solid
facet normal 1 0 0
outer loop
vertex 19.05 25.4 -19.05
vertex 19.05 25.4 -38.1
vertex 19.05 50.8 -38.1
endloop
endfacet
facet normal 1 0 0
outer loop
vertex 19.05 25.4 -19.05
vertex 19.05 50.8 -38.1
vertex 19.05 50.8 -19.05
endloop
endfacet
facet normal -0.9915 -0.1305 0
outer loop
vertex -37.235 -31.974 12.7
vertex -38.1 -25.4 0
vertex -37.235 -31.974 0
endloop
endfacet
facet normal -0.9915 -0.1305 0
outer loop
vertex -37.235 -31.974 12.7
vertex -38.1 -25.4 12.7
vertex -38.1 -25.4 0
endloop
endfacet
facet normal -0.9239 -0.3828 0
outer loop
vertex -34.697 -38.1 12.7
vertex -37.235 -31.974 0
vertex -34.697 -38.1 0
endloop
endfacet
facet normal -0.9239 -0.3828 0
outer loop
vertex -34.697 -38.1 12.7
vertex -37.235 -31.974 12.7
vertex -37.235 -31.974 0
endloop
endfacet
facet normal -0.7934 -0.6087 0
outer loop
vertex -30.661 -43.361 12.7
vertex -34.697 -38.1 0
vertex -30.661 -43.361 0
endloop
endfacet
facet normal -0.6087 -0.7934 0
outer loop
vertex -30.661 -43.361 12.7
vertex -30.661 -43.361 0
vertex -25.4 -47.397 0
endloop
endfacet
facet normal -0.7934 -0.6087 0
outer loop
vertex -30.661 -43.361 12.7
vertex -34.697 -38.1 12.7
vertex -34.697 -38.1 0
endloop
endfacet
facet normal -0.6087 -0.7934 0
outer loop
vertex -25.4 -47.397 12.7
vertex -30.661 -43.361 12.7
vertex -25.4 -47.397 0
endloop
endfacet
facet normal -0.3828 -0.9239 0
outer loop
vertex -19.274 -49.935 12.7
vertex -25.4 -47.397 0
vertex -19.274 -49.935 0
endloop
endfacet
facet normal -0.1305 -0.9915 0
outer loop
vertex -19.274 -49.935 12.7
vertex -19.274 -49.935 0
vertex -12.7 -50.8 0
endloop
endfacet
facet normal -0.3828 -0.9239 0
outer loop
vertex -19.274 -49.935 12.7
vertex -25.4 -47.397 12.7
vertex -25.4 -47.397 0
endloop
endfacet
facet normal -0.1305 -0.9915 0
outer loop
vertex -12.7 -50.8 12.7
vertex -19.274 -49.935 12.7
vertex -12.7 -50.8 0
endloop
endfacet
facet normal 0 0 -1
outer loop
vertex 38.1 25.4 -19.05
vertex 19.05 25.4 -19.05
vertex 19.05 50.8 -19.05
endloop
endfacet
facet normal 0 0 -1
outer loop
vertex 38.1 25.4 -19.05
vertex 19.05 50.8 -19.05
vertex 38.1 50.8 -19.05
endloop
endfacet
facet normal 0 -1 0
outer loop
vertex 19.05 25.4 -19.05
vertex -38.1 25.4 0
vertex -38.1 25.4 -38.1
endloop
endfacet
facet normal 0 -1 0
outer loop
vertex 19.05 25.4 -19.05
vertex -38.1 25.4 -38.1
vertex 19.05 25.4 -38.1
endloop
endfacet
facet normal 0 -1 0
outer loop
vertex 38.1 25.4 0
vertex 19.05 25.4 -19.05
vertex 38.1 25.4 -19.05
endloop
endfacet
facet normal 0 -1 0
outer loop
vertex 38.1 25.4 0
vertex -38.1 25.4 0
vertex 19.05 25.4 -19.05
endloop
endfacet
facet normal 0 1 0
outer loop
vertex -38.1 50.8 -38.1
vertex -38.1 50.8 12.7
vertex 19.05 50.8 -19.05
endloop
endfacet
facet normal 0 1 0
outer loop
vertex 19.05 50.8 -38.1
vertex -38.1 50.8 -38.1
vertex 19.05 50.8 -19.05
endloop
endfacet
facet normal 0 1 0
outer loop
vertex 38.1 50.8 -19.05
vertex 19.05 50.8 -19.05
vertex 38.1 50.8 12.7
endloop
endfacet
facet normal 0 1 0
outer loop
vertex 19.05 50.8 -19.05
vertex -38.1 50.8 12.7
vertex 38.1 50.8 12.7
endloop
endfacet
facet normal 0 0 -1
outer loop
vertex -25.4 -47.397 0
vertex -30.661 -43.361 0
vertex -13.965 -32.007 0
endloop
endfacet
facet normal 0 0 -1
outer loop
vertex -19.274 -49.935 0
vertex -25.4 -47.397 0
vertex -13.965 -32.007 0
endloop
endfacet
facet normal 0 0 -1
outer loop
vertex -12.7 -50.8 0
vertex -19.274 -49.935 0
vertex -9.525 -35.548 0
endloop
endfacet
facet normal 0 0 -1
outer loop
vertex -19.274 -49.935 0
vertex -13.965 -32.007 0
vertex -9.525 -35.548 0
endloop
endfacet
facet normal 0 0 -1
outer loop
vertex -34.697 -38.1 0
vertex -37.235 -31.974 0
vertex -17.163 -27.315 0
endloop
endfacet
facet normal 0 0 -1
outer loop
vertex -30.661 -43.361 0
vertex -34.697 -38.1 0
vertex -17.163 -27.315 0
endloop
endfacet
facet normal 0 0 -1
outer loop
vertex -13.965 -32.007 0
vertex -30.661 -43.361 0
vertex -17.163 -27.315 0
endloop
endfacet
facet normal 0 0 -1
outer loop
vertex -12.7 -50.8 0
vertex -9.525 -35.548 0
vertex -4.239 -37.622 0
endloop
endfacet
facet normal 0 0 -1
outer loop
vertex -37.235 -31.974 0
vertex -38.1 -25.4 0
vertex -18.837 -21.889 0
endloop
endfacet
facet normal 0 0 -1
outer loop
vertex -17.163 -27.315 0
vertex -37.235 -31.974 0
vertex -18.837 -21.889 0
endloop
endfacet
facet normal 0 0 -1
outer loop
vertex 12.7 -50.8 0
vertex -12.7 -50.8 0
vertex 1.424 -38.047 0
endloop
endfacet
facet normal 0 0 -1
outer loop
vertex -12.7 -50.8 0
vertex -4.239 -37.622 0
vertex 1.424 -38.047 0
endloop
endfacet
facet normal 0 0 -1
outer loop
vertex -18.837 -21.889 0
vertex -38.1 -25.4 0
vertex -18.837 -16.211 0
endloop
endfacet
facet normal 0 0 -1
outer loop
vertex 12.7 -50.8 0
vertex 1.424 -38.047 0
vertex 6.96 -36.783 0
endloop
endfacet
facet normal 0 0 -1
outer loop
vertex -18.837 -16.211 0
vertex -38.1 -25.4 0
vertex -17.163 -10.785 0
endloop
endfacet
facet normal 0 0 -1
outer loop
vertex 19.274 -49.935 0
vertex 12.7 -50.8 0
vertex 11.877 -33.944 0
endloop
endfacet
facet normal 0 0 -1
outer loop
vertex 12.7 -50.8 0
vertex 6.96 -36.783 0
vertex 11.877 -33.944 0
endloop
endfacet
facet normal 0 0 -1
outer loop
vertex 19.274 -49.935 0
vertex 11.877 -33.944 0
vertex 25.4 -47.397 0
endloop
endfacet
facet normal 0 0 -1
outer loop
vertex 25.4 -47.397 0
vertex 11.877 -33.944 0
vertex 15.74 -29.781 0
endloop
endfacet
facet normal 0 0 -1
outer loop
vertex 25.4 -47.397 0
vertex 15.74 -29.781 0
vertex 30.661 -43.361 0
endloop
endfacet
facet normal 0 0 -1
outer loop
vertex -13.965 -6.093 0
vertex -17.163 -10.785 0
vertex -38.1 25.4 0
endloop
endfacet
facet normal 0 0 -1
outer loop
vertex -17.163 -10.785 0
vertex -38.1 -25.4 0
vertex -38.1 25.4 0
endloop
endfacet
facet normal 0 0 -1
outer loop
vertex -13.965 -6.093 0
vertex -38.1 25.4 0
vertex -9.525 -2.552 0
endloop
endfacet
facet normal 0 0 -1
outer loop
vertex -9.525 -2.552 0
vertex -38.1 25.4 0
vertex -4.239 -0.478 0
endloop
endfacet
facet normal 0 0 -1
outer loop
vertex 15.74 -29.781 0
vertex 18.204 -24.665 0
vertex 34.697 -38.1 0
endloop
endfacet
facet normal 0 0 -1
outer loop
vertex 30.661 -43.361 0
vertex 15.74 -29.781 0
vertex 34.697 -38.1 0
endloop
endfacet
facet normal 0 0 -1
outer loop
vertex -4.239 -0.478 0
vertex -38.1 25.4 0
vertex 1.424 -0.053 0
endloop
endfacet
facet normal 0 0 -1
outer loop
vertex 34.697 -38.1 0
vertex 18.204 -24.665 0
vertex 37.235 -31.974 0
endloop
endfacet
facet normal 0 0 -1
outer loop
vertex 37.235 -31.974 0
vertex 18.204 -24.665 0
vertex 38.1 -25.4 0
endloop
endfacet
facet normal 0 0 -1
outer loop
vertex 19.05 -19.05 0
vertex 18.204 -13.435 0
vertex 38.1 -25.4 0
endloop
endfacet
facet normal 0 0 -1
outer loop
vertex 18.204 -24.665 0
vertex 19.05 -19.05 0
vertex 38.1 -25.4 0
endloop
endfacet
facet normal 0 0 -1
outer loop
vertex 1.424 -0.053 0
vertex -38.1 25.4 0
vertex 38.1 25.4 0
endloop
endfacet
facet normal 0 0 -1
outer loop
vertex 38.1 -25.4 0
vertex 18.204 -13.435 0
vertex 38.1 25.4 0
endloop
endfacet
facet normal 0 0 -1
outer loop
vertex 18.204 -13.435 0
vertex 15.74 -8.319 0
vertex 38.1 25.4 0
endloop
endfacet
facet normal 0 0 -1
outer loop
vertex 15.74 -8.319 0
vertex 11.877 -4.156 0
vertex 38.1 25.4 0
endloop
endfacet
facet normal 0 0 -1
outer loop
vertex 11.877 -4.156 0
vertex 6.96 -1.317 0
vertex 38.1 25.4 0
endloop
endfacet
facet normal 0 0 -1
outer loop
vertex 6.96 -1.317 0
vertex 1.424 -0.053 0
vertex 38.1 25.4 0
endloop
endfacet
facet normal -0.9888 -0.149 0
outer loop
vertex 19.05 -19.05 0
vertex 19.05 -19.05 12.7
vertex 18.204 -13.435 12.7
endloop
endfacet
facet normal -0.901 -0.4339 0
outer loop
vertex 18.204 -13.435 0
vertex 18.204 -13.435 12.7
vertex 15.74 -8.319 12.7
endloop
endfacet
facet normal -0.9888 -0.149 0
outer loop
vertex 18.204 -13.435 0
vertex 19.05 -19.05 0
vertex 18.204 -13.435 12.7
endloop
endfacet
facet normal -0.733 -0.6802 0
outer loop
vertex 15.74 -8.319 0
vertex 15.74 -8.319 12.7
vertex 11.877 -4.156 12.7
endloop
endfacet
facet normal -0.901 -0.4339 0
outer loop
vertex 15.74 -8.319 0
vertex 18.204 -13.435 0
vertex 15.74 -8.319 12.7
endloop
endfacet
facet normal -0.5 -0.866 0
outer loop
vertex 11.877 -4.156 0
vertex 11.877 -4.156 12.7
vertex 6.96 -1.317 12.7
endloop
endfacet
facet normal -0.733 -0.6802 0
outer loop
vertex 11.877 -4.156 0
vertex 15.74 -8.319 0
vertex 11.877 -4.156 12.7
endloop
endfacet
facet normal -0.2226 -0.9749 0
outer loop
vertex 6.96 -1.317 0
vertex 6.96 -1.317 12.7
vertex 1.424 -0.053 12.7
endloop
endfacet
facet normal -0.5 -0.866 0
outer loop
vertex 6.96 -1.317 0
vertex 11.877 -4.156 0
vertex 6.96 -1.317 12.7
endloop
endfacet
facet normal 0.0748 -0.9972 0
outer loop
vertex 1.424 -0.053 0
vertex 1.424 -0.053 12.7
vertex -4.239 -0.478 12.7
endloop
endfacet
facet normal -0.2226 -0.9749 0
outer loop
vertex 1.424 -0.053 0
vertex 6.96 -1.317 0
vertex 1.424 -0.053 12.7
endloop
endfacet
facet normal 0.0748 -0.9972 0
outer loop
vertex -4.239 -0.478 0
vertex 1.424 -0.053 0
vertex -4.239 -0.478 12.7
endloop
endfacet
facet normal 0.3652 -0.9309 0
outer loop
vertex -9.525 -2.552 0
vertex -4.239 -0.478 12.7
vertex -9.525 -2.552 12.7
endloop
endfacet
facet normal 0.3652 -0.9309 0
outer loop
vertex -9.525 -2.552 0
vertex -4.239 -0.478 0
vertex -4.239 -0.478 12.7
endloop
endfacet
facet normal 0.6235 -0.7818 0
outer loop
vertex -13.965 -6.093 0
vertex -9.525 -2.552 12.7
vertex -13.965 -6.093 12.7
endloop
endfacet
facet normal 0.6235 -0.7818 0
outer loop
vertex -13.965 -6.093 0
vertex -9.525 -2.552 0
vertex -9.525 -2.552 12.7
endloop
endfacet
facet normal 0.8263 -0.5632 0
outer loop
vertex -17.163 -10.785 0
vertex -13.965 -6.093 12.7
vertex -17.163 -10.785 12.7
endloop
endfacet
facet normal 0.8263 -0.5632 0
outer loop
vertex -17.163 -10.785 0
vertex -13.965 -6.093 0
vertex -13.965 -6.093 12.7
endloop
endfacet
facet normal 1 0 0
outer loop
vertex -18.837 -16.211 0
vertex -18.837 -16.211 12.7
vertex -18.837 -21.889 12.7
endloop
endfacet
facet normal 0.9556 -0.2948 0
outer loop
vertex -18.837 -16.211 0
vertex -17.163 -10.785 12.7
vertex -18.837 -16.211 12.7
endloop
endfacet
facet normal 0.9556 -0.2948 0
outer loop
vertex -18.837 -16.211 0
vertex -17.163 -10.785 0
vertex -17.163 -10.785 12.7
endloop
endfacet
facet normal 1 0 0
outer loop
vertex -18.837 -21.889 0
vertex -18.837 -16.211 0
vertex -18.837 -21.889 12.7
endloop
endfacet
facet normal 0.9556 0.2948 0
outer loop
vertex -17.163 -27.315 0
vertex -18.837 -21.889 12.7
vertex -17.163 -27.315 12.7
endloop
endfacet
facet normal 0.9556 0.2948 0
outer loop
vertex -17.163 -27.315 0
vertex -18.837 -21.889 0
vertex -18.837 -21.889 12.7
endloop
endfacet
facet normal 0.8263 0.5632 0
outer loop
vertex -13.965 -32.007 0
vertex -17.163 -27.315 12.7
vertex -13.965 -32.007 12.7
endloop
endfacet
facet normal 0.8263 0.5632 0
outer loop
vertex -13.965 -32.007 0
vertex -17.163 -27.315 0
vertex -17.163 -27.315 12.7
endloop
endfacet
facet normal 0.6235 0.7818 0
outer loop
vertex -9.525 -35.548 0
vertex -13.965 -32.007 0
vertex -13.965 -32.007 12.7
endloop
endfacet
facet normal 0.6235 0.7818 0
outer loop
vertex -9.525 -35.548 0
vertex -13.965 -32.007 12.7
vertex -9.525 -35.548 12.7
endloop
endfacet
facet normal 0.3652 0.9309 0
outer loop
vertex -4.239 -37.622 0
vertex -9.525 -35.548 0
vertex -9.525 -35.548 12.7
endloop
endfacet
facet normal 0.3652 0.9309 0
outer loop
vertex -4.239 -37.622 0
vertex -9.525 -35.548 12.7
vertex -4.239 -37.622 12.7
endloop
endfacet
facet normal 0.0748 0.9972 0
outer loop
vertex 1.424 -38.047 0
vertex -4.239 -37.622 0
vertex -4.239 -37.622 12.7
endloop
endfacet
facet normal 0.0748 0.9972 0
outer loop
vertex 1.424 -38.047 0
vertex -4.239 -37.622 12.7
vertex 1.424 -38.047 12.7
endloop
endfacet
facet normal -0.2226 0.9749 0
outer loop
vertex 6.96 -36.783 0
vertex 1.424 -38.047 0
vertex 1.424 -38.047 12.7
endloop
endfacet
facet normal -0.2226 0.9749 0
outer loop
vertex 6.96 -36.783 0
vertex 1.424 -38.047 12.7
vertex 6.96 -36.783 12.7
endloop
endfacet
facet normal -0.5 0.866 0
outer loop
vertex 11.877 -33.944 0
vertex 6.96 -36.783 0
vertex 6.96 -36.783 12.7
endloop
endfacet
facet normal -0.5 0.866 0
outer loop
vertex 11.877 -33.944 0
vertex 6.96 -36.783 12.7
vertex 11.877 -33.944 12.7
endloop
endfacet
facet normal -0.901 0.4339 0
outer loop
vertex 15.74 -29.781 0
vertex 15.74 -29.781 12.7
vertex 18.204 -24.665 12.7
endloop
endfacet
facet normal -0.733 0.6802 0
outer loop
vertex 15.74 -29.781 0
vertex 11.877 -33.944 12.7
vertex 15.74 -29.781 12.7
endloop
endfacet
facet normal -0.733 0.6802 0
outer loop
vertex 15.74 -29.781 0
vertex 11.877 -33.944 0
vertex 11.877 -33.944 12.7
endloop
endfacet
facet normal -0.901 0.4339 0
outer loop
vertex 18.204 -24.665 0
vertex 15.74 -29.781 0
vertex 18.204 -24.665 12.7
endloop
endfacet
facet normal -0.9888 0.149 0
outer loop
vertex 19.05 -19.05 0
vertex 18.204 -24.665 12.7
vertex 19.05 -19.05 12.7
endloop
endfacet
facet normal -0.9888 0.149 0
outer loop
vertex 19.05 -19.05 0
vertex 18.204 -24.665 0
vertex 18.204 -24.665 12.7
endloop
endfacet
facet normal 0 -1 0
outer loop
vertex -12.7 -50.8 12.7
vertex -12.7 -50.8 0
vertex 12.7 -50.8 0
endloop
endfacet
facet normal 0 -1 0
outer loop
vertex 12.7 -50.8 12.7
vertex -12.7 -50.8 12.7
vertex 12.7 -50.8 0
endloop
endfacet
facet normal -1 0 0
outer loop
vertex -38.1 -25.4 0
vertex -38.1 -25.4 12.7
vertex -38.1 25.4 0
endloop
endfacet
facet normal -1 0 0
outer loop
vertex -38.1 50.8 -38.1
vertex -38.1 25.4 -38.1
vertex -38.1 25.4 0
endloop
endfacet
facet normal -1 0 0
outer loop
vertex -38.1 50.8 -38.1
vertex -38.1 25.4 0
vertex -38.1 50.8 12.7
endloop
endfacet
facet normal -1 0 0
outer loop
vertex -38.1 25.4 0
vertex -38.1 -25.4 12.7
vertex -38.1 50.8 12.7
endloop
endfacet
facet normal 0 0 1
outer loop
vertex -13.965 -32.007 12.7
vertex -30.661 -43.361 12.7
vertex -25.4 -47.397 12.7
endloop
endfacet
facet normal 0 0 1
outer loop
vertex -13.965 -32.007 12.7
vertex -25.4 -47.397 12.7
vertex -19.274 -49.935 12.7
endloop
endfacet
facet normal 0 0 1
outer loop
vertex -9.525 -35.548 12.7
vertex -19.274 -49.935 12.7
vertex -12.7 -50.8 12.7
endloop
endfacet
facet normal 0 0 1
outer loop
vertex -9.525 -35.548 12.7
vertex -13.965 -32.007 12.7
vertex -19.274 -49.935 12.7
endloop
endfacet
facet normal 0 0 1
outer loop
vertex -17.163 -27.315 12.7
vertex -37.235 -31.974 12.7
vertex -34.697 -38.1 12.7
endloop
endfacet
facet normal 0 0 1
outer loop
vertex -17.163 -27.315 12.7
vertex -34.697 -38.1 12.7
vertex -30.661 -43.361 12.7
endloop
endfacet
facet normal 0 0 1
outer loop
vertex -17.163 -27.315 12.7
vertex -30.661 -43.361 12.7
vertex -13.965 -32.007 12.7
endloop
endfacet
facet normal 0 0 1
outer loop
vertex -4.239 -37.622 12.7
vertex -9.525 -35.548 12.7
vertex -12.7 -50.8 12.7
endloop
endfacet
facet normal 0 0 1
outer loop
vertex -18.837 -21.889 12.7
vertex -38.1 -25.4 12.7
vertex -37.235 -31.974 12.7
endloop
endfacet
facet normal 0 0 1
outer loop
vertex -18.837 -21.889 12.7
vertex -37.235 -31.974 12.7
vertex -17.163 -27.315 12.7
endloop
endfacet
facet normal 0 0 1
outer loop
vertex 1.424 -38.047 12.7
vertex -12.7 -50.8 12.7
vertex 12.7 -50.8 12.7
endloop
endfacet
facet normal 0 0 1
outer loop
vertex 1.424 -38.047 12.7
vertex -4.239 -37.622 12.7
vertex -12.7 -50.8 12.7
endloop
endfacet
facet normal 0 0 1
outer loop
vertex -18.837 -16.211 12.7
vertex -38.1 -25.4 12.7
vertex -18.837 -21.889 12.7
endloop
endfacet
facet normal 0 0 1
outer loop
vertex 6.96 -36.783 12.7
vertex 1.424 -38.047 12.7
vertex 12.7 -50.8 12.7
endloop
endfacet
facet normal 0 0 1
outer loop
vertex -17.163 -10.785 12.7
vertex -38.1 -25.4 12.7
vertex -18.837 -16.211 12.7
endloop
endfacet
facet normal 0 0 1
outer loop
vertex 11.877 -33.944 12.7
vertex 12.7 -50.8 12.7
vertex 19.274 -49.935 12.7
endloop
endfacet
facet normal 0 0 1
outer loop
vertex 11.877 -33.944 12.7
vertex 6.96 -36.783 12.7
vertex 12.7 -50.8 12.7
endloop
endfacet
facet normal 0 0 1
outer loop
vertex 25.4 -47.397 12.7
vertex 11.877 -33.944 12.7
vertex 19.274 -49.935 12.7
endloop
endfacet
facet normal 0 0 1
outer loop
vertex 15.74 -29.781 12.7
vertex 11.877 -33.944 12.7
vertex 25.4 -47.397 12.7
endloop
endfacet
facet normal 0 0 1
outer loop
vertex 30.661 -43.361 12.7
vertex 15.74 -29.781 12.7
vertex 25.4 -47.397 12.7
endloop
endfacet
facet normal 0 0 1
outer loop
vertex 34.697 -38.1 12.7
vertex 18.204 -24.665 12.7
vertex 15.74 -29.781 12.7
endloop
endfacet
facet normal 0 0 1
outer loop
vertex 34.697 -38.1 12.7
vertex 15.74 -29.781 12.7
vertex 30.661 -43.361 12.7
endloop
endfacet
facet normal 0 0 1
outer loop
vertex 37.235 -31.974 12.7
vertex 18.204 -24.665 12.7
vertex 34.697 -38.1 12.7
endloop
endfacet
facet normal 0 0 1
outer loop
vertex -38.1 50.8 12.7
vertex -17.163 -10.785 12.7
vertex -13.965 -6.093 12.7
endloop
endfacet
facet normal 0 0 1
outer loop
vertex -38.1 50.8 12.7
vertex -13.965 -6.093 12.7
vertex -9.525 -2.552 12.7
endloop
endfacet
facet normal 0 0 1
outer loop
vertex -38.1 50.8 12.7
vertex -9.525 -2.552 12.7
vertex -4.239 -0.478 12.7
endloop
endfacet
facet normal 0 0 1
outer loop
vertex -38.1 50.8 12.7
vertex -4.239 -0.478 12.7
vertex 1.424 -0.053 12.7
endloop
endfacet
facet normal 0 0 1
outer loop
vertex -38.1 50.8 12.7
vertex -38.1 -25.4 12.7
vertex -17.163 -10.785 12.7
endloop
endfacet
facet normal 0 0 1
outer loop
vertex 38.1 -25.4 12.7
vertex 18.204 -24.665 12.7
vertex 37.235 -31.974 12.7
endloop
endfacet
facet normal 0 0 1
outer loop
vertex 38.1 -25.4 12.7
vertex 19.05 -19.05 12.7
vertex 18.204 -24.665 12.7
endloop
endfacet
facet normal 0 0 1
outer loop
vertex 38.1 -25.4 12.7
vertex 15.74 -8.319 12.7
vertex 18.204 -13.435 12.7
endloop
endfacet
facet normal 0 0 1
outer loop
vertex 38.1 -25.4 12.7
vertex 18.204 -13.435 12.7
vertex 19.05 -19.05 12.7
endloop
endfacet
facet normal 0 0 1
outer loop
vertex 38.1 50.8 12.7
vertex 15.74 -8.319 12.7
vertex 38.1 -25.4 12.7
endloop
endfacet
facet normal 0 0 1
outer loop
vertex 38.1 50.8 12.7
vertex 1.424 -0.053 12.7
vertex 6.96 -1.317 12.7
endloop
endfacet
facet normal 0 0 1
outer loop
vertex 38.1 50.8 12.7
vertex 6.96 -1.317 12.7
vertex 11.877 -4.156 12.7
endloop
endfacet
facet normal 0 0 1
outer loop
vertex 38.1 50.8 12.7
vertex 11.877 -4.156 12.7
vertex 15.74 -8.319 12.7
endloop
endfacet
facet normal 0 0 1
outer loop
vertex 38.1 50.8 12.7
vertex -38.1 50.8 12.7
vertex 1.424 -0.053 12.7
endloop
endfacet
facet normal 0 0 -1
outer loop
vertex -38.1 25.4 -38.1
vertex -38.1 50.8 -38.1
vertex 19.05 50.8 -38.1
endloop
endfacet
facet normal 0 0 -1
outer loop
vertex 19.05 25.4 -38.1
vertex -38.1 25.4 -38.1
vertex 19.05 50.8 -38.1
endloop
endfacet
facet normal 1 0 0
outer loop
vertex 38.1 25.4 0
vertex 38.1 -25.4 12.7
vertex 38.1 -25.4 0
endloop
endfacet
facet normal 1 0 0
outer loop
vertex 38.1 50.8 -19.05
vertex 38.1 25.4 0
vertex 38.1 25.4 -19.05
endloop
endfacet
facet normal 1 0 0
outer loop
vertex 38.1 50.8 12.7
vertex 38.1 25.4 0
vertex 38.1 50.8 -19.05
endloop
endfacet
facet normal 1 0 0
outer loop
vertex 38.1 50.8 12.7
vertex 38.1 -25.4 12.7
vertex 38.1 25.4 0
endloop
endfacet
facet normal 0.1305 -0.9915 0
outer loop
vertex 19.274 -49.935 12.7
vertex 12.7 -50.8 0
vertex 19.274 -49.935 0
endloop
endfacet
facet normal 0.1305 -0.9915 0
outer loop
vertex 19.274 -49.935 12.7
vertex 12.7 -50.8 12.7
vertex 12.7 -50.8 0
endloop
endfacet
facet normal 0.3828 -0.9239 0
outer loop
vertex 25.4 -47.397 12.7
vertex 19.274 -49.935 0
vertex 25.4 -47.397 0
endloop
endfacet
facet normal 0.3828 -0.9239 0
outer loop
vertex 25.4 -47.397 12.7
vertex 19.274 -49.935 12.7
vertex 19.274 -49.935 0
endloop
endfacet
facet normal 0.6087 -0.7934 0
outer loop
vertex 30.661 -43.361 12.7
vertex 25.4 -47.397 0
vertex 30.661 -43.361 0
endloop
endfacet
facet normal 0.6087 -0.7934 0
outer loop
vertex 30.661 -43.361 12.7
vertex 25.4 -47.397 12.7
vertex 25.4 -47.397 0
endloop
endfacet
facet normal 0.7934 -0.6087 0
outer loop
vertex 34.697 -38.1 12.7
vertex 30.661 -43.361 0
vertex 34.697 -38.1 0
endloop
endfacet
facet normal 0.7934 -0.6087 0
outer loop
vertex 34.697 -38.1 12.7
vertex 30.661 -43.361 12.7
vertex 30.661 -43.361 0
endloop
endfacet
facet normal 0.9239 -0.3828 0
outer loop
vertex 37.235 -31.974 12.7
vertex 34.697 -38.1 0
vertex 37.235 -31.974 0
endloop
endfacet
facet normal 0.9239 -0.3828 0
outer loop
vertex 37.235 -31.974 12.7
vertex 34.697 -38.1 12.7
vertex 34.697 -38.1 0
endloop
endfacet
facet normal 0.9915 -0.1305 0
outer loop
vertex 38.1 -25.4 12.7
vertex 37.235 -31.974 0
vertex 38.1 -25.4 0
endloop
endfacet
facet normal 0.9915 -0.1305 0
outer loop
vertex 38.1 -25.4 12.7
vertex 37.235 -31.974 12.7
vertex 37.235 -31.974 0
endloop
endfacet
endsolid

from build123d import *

# Parameters (mm, degrees)
F0_W     = 76.2
F0_H     = 101.6
F1_DEPTH = 12.7
F2_R     = 19.05
F3_DEPTH = 25.4
F4_W     = 76.2
F4_H     = 25.4
F5_DEPTH = 38.1
F6_W     = 19.05
F6_H     = 19.05
F7_DEPTH = 25.4
F8_R     = 25.4


with BuildPart() as f1:
    # F0 (on Top) → F1 (new body)
    with BuildSketch(Plane.XY):
        Rectangle(F0_W, F0_H)
    extrude(amount=F1_DEPTH)

    # F2 (on Top) → F3 (cut)
    with BuildSketch(Plane.XY):
        with Locations((0, -19.05)):
            Circle(F2_R)
    extrude(amount=F3_DEPTH, mode=Mode.SUBTRACT)

    # F4 (on Top) → F5 (join)
    with BuildSketch(Plane.XY):
        with Locations((0, 38.1)):
            Rectangle(F4_W, F4_H)
    extrude(amount=-F5_DEPTH)

    # F6 (on face) → F7 (cut)
    with BuildSketch(Plane.XZ.offset(-25.4)):
        with Locations((28.575, -28.575)):
            Rectangle(F6_W, F6_H)
    extrude(amount=-F7_DEPTH, mode=Mode.SUBTRACT)

    # F8
    f8_edges = [f1.edges().sort_by_distance(p)[0] for p in [
        (38.1, -50.8, 6.35),
        (-38.1, -50.8, 6.35),
    ]]
    fillet(f8_edges, radius=F8_R)


solid = f1.part
